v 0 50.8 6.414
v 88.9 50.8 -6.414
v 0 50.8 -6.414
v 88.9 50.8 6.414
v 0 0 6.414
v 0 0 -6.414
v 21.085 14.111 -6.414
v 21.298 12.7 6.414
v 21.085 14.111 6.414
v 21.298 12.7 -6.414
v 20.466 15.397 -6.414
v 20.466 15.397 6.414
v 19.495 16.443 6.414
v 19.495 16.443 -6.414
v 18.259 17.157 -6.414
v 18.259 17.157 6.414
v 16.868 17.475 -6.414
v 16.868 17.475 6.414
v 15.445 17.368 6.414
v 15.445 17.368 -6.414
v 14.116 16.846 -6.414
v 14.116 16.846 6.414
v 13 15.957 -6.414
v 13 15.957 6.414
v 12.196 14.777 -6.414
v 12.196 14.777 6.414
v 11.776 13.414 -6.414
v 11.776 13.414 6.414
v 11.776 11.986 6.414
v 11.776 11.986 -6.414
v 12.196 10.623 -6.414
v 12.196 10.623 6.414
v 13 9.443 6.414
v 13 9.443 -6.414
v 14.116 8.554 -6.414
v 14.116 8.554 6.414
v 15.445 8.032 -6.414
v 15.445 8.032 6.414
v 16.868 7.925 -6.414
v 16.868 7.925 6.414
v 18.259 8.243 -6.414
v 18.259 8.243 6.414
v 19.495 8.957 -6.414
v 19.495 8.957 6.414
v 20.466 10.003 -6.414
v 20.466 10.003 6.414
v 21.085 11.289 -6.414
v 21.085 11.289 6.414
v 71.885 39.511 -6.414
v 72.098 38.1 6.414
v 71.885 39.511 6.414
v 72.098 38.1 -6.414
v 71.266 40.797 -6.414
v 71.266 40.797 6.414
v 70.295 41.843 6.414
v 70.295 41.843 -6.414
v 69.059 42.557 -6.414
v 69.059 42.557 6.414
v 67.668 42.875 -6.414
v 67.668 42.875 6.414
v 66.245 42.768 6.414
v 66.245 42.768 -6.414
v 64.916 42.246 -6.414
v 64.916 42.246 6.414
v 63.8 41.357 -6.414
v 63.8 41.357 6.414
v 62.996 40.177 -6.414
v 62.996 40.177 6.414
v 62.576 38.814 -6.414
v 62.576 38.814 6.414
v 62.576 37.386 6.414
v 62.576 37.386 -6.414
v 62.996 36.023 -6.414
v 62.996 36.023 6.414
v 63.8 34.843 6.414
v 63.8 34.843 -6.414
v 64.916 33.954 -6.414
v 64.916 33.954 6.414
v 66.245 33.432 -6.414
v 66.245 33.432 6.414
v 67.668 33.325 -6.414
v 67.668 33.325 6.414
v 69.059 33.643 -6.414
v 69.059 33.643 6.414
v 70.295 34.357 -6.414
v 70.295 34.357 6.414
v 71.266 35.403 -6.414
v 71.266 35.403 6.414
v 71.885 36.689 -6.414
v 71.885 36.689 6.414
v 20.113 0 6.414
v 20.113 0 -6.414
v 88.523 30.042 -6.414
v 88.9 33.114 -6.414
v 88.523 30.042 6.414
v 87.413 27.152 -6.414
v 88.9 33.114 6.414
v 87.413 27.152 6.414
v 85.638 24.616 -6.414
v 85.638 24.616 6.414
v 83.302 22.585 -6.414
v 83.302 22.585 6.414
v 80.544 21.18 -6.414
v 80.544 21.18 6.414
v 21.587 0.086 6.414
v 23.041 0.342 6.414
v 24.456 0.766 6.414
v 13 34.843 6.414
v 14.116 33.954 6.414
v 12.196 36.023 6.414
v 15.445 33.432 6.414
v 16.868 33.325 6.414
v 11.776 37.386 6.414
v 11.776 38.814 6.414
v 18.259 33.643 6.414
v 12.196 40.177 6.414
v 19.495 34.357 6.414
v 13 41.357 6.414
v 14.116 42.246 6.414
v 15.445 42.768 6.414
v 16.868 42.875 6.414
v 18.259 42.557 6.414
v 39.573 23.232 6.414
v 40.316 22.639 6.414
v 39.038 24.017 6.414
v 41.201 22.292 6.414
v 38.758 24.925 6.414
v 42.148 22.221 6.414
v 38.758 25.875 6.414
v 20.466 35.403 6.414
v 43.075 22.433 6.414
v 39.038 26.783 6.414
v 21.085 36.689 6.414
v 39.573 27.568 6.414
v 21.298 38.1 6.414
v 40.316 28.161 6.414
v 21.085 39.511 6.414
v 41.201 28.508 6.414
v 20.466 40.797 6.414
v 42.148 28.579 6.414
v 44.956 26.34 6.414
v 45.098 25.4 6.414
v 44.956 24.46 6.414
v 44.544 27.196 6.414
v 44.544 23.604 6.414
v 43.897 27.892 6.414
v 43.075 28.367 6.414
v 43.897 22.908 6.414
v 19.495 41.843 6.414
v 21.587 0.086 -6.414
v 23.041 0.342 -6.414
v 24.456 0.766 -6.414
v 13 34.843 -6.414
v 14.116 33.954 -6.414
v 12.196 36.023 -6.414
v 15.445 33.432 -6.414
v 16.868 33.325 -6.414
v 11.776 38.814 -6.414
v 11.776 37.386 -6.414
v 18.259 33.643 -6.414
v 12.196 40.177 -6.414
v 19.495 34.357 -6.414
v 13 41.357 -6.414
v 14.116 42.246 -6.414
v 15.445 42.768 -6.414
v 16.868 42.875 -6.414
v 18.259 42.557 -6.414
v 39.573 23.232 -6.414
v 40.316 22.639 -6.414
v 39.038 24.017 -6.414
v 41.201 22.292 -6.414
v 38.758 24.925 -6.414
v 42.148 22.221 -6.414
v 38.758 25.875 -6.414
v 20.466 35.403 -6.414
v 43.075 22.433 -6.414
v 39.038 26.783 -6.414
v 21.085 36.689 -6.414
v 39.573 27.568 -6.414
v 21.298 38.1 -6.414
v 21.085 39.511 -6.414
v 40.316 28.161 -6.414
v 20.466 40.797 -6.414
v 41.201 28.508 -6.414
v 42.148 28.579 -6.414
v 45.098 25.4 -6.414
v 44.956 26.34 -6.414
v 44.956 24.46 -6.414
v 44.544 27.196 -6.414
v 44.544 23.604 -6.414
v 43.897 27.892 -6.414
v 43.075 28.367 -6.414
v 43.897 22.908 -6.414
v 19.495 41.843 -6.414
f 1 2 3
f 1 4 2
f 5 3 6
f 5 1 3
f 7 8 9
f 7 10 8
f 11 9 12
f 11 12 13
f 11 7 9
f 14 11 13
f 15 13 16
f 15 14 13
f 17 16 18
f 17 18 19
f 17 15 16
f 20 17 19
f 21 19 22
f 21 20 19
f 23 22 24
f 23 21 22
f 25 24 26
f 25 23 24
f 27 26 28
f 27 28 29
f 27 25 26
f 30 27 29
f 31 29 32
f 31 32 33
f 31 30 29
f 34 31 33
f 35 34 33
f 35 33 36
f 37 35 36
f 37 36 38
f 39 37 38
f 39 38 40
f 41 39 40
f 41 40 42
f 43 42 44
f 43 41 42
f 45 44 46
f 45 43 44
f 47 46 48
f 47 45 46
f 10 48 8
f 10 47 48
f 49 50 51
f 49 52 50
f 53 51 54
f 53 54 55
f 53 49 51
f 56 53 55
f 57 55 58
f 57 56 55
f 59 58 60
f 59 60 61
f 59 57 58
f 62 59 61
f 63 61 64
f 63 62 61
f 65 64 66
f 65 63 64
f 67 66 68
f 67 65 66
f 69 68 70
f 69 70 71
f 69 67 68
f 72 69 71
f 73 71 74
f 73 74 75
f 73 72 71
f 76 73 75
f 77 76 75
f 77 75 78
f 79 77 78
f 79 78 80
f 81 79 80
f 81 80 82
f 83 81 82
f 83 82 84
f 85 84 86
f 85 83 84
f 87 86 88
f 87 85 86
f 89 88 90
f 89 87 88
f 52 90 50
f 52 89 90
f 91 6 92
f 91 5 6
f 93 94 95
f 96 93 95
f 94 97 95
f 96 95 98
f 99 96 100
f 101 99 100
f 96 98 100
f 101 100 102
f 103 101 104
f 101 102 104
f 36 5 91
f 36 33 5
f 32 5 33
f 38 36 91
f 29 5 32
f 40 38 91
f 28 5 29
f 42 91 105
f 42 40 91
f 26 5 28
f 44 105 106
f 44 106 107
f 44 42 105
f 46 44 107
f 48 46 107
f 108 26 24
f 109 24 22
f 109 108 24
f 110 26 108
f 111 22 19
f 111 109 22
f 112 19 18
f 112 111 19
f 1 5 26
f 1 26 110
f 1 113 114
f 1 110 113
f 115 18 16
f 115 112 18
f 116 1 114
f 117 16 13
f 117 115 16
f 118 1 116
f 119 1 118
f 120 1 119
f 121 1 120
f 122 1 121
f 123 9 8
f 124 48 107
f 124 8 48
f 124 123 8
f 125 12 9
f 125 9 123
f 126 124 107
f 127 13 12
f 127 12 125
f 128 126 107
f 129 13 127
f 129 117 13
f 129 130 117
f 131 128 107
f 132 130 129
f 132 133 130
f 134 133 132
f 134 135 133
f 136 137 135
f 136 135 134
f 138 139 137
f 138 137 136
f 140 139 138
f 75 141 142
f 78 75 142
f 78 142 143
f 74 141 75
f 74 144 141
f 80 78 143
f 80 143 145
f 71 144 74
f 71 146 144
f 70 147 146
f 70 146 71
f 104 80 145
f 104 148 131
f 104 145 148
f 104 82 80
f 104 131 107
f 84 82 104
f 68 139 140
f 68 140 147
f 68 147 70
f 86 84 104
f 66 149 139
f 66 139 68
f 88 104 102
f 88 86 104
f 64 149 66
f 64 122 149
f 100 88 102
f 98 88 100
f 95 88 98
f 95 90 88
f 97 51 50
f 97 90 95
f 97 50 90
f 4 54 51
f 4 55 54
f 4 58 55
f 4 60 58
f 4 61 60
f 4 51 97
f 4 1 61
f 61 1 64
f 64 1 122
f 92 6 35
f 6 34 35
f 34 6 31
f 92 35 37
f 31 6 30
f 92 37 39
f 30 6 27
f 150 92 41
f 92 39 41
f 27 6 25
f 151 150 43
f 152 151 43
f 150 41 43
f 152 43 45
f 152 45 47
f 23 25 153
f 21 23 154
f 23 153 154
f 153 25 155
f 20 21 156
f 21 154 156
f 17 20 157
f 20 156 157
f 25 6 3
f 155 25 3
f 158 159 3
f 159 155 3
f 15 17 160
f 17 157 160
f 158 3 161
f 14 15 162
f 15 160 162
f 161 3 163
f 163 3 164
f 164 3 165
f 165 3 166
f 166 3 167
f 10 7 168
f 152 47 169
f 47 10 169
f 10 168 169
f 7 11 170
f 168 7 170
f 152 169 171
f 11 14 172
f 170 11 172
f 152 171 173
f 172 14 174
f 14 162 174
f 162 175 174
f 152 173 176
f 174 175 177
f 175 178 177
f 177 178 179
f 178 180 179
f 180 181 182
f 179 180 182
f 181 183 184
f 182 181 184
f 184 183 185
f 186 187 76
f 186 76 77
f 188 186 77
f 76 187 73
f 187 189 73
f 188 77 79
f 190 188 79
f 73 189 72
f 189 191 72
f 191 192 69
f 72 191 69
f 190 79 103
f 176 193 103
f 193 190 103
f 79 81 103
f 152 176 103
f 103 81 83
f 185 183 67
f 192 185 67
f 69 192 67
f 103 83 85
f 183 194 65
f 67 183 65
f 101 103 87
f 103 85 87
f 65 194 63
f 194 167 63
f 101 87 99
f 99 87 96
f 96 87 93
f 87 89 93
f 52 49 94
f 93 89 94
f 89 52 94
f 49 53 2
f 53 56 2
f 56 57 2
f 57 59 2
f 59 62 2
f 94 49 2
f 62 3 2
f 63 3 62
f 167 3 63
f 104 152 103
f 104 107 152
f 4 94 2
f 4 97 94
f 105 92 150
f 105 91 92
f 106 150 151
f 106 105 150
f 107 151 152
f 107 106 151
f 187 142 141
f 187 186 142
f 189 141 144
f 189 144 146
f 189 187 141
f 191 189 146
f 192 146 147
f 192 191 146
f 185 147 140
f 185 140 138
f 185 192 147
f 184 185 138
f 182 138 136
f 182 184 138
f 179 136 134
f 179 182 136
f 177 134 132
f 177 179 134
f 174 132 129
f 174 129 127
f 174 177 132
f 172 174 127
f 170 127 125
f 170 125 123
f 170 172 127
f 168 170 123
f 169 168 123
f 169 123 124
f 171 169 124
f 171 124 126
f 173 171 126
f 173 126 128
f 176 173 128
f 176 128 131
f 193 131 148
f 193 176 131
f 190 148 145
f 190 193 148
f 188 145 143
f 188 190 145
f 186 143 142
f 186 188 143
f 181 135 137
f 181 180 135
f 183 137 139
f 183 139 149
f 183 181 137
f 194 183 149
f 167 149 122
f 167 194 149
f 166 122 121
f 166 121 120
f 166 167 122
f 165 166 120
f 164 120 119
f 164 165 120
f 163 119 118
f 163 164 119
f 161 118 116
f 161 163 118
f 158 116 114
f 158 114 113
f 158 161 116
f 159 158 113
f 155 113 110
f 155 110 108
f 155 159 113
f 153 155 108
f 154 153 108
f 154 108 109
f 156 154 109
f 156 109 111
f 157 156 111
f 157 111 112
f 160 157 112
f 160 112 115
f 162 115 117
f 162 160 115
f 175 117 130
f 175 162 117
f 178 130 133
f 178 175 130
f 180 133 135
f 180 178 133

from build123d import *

# Parameters (mm, degrees)
SKETCH1_R           = 4.7879
SKETCH1_R_2         = 3.1877
BOSS_EXTRUDE1_DEPTH = 6.4135
FILLET1_R           = 12.7


with BuildPart() as part:
    # Sketch1 → Boss-Extrude1 (new body, symmetric)
    with BuildSketch(Plane.XY):
        Polygon((0, 0), (22.352, 0), (88.9, 24.22149115), (88.9, 50.8), (0, 50.8), align=None)
        with Locations((16.51, 12.7)):
            Circle(SKETCH1_R, mode=Mode.SUBTRACT)
        with Locations((16.51, 38.1)):
            Circle(SKETCH1_R, mode=Mode.SUBTRACT)
        with Locations((67.31, 38.1)):
            Circle(SKETCH1_R, mode=Mode.SUBTRACT)
        with Locations((41.91, 25.4)):
            Circle(SKETCH1_R_2, mode=Mode.SUBTRACT)
    extrude(amount=BOSS_EXTRUDE1_DEPTH, both=True)

    # Fillet1
    fillet1_edges = [part.edges().sort_by_distance(p)[0] for p in [
        (88.9, 24.22149115, 0),
        (22.352, 0, 0),
    ]]
    fillet(fillet1_edges, radius=FILLET1_R)


solid = part.part
